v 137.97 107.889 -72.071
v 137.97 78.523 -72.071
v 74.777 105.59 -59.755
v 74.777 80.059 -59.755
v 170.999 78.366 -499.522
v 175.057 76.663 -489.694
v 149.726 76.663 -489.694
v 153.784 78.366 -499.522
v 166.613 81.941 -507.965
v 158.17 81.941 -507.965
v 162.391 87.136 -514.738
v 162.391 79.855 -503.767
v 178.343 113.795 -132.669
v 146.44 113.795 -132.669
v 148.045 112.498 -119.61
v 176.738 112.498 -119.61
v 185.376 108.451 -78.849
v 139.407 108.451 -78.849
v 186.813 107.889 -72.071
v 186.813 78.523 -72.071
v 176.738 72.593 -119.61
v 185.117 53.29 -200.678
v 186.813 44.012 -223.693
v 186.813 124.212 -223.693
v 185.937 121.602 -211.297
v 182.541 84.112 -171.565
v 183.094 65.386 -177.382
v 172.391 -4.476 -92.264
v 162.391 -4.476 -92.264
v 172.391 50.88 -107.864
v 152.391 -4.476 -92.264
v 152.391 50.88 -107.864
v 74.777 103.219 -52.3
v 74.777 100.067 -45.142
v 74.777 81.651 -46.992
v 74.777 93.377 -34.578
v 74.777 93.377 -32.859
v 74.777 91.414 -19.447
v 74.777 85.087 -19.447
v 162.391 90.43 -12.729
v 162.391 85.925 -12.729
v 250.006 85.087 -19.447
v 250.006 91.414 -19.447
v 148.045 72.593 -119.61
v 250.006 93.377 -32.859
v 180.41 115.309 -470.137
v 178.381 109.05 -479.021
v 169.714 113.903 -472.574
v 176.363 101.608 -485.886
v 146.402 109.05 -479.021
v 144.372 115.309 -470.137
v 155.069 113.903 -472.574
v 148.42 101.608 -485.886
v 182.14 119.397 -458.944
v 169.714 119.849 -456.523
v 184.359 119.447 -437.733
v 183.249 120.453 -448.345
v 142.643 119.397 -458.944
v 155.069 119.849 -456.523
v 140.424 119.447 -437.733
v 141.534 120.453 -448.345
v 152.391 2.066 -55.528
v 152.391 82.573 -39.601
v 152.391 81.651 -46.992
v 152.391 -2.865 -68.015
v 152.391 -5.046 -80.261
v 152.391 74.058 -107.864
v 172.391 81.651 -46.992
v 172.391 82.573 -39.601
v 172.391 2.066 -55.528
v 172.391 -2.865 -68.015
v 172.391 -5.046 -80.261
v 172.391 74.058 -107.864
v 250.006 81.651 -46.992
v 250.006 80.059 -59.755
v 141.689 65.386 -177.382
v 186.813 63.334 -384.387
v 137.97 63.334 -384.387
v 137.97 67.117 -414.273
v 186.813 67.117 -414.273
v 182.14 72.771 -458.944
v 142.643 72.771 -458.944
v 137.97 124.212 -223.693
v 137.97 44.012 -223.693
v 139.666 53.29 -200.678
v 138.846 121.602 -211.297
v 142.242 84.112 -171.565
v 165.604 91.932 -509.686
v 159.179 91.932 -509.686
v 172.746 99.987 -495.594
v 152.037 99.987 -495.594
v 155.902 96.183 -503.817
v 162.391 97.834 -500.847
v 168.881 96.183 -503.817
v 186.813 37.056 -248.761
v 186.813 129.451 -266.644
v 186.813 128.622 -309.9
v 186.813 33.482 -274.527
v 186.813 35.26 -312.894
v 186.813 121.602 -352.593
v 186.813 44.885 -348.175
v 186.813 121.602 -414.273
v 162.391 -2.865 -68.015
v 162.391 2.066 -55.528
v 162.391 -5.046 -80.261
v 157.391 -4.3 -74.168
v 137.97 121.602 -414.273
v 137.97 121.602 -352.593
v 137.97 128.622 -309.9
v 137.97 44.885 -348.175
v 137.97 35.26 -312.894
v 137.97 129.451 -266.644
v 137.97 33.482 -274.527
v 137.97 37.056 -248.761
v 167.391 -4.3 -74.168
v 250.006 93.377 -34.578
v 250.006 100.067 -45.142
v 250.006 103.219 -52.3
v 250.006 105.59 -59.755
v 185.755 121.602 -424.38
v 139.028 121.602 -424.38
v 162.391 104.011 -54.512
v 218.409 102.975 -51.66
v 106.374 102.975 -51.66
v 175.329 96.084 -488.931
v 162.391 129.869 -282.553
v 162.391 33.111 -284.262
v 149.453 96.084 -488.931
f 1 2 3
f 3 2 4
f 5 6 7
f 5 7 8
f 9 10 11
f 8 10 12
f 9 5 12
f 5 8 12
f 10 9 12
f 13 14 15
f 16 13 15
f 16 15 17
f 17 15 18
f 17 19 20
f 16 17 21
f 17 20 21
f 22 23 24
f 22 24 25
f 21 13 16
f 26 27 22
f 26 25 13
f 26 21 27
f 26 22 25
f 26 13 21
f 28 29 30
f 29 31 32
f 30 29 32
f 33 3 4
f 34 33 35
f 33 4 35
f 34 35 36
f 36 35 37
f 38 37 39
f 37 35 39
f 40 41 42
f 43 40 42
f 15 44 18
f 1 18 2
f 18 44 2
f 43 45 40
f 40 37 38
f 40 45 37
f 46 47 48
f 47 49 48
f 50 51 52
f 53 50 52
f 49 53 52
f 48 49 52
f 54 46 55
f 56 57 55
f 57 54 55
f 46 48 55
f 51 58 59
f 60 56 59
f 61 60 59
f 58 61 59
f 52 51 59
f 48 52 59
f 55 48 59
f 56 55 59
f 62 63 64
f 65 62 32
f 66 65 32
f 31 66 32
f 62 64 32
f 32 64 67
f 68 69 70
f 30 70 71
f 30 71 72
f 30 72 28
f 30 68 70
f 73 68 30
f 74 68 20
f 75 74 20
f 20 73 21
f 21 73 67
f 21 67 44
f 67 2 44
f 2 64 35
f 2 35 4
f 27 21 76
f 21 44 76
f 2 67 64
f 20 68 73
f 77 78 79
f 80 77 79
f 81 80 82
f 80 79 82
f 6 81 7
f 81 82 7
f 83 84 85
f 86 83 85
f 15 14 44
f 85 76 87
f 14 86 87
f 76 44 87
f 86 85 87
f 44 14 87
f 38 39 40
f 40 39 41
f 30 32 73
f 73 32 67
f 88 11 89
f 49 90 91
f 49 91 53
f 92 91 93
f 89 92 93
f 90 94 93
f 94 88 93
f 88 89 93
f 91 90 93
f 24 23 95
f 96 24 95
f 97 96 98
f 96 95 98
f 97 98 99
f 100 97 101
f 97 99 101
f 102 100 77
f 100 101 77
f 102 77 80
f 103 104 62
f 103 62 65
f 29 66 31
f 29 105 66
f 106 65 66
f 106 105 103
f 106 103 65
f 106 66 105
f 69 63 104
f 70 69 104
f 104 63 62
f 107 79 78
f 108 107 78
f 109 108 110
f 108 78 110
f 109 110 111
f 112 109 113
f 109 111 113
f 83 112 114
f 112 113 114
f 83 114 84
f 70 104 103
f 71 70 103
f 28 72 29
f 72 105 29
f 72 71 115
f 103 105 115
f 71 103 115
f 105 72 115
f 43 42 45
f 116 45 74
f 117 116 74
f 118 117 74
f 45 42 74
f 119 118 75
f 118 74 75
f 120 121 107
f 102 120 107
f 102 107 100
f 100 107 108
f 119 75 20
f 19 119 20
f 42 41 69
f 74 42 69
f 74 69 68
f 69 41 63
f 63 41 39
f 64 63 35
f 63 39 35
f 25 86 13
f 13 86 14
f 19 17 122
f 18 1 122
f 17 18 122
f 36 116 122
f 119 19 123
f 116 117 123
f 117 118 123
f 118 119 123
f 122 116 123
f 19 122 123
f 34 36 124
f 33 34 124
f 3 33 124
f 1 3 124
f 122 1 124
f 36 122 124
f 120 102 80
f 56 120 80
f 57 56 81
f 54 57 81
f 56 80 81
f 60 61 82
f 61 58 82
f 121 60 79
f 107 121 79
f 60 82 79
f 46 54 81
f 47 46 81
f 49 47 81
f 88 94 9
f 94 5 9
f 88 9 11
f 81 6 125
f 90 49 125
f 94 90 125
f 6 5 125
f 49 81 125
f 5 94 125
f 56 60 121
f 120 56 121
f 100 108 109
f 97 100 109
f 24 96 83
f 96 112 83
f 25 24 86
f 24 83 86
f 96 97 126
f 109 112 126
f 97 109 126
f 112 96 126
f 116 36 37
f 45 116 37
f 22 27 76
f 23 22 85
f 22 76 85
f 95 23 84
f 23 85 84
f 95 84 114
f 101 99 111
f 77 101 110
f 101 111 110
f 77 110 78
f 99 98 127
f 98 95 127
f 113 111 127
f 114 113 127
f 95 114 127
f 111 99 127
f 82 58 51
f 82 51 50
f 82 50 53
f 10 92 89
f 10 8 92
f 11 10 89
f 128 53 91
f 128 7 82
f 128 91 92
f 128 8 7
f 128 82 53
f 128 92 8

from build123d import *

# Parameters (mm, degrees)
BOSS_EXTRUDE1_DEPTH      = 240
SKETCH4_OUTSIDE_W        = 620.683
SKETCH4_OUTSIDE_H        = 358.674
CUT_EXTRUDE1_DEPTH       = 251.005507708
BOSS_EXTRUDE2_DEPTH      = 10
BOSS_EXTRUDE2_DEPTH_BACK = 10


with BuildPart() as part:
    # Sketch3 → Boss-Extrude1 (new body)
    with BuildSketch(Plane(origin=(0, 0, 0), x_dir=(1, 0, 0), z_dir=(0, 1, 0))):
        with BuildLine():
            Line((137.970364324, 414.272883639), (137.970364324, 223.69340993))
            add(Edge.make_bspline(
                [(137.970364324, 223.69340993), (141.476966078, 171.478024708), (148.044741181, 119.610332165)],
                knots=[0, 0, 0, 0.887153435, 0.887153435, 0.887153435], degree=2))
            Line((148.044741181, 119.610332165), (137.970364324, 72.071329968))
            Line((137.970364324, 72.071329968), (74.77736212, 59.754974694))
            Line((74.77736212, 59.754974694), (74.77736212, 19.446902889))
            Line((74.77736212, 19.446902889), (162.391434864, 12.728890921))
            Line((162.391434864, 12.728890921), (250.005507608, 19.446902889))
            Line((250.005507608, 19.446902889), (250.005507608, 59.754974694))
            Line((250.005507608, 59.754974694), (186.812505404, 72.071329968))
            Line((186.812505404, 72.071329968), (176.738128547, 119.610332165))
            add(Edge.make_bspline(
                [(186.812505404, 223.69340993), (183.30590365, 171.478024708), (176.738128547, 119.610332165)],
                knots=[0, 0, 0, 0.887153435, 0.887153435, 0.887153435], degree=2))
            Line((186.812505404, 223.69340993), (186.812505404, 414.272883639))
            Line((186.812505404, 414.272883639), (182.139885098, 458.943511131))
            add(Edge.make_bspline(
                [(182.139885098, 458.943511131), (178.393317936, 491.021832881), (162.391434864, 514.737632441)],
                knots=[0, 0, 0, 0.490132675, 0.490132675, 0.490132675], degree=2))
            add(Edge.make_bspline(
                [(142.64298463, 458.943511131), (146.389551792, 491.021832881), (162.391434864, 514.737632441)],
                knots=[0, 0, 0, 0.490132675, 0.490132675, 0.490132675], degree=2))
            Line((142.64298463, 458.943511131), (137.970364324, 414.272883639))
        make_face()
    extrude(amount=BOSS_EXTRUDE1_DEPTH)

    # Sketch4 outside → Cut-Extrude1 (cut, through all)
    with BuildSketch(Plane(origin=(0, 0, 0), x_dir=(0, 0, -1), z_dir=(1, 0, 0))):
        with Locations((263.7335, 120)):
            Rectangle(SKETCH4_OUTSIDE_W, SKETCH4_OUTSIDE_H)
        with BuildLine():
            Line((12.728890921, 85.924982425), (46.991957136, 81.651030623))
            Line((46.991957136, 81.651030623), (177.382016131, 65.386262487))
            add(Edge.make_bspline(
                [(177.382016131, 65.386262487), (287.640309593, 1.862307292), (384.386809277, 63.333754572)],
                knots=[0, 0, 0, 1, 1, 1], degree=2))
            Line((384.386809277, 63.333754572), (489.693965282, 76.663405275))
            add(Edge.make_bspline(
                [(489.693965282, 76.663405275), (505.317689733, 77.809278687), (514.737632441, 87.136419671)],
                knots=[0, 0, 0, 0.756426815, 0.756426815, 0.756426815], degree=2))
            add(Edge.make_bspline(
                [(514.737632441, 87.136419671), (501.382115592, 101.295387019), (485.88559641, 101.608221382)],
                knots=[0, 0, 0, 0.70811857, 0.70811857, 0.70811857], degree=2))
            add(Edge.make_bspline(
                [(485.88559641, 101.608221382), (473.943480605, 117.077174504), (457.892628594, 123.023372981), (437.733040377, 119.446816811)],
                knots=[0, 0, 0, 0, 0.856300563, 0.856300563, 0.856300563, 0.856300563], degree=3))
            Line((437.733040377, 119.446816811), (424.380439139, 121.602157956))
            Line((424.380439139, 121.602157956), (352.592685915, 121.602157956))
            add(Edge.make_bspline(
                [(352.592685915, 121.602157956), (283.160705497, 138.135189476), (211.297296684, 121.602157956)],
                knots=[0, 0, 0, 1, 1, 1], degree=2))
            Line((211.297296684, 121.602157956), (132.668959601, 113.79500177))
            Line((132.668959601, 113.79500177), (78.849169619, 108.45113311))
            add(Edge.make_bspline(
                [(78.849169619, 108.45113311), (52.309636156, 107.107843422), (34.577807776, 93.377447612)],
                knots=[0, 0, 0, 0.568417753, 0.568417753, 0.568417753], degree=2))
            Line((34.577807776, 93.377447612), (32.858632307, 93.377447612))
            Line((32.858632307, 93.377447612), (12.728890921, 90.430289665))
            Line((12.728890921, 90.430289665), (12.728890921, 85.924982425))
        make_face(mode=Mode.SUBTRACT)
    extrude(amount=CUT_EXTRUDE1_DEPTH, mode=Mode.SUBTRACT)

    # Sketch5 → Boss-Extrude2 (add, two sides)
    with BuildSketch(Plane.ZY.offset(-162.391434864)) as boss_extrude2_sk:
        with BuildLine():
            Line((-39.600938792, 82.572981273), (-55.527663258, 2.06573062))
            add(Edge.make_bspline(
                [(-55.527663258, 2.06573062), (-74.440482287, -7.393827092), (-92.263908139, -4.476340386)],
                knots=[0, 0, 0, 0.637969312, 0.637969312, 0.637969312], degree=2))
            Line((-92.263908139, -4.476340386), (-107.864231307, 50.87964505))
            Line((-107.864231307, 50.87964505), (-107.864231307, 74.057864143))
            Line((-107.864231307, 74.057864143), (-39.600938792, 82.572981273))
        make_face()
    extrude(amount=BOSS_EXTRUDE2_DEPTH)
    extrude(boss_extrude2_sk.sketch, amount=-BOSS_EXTRUDE2_DEPTH_BACK)


solid = part.part
